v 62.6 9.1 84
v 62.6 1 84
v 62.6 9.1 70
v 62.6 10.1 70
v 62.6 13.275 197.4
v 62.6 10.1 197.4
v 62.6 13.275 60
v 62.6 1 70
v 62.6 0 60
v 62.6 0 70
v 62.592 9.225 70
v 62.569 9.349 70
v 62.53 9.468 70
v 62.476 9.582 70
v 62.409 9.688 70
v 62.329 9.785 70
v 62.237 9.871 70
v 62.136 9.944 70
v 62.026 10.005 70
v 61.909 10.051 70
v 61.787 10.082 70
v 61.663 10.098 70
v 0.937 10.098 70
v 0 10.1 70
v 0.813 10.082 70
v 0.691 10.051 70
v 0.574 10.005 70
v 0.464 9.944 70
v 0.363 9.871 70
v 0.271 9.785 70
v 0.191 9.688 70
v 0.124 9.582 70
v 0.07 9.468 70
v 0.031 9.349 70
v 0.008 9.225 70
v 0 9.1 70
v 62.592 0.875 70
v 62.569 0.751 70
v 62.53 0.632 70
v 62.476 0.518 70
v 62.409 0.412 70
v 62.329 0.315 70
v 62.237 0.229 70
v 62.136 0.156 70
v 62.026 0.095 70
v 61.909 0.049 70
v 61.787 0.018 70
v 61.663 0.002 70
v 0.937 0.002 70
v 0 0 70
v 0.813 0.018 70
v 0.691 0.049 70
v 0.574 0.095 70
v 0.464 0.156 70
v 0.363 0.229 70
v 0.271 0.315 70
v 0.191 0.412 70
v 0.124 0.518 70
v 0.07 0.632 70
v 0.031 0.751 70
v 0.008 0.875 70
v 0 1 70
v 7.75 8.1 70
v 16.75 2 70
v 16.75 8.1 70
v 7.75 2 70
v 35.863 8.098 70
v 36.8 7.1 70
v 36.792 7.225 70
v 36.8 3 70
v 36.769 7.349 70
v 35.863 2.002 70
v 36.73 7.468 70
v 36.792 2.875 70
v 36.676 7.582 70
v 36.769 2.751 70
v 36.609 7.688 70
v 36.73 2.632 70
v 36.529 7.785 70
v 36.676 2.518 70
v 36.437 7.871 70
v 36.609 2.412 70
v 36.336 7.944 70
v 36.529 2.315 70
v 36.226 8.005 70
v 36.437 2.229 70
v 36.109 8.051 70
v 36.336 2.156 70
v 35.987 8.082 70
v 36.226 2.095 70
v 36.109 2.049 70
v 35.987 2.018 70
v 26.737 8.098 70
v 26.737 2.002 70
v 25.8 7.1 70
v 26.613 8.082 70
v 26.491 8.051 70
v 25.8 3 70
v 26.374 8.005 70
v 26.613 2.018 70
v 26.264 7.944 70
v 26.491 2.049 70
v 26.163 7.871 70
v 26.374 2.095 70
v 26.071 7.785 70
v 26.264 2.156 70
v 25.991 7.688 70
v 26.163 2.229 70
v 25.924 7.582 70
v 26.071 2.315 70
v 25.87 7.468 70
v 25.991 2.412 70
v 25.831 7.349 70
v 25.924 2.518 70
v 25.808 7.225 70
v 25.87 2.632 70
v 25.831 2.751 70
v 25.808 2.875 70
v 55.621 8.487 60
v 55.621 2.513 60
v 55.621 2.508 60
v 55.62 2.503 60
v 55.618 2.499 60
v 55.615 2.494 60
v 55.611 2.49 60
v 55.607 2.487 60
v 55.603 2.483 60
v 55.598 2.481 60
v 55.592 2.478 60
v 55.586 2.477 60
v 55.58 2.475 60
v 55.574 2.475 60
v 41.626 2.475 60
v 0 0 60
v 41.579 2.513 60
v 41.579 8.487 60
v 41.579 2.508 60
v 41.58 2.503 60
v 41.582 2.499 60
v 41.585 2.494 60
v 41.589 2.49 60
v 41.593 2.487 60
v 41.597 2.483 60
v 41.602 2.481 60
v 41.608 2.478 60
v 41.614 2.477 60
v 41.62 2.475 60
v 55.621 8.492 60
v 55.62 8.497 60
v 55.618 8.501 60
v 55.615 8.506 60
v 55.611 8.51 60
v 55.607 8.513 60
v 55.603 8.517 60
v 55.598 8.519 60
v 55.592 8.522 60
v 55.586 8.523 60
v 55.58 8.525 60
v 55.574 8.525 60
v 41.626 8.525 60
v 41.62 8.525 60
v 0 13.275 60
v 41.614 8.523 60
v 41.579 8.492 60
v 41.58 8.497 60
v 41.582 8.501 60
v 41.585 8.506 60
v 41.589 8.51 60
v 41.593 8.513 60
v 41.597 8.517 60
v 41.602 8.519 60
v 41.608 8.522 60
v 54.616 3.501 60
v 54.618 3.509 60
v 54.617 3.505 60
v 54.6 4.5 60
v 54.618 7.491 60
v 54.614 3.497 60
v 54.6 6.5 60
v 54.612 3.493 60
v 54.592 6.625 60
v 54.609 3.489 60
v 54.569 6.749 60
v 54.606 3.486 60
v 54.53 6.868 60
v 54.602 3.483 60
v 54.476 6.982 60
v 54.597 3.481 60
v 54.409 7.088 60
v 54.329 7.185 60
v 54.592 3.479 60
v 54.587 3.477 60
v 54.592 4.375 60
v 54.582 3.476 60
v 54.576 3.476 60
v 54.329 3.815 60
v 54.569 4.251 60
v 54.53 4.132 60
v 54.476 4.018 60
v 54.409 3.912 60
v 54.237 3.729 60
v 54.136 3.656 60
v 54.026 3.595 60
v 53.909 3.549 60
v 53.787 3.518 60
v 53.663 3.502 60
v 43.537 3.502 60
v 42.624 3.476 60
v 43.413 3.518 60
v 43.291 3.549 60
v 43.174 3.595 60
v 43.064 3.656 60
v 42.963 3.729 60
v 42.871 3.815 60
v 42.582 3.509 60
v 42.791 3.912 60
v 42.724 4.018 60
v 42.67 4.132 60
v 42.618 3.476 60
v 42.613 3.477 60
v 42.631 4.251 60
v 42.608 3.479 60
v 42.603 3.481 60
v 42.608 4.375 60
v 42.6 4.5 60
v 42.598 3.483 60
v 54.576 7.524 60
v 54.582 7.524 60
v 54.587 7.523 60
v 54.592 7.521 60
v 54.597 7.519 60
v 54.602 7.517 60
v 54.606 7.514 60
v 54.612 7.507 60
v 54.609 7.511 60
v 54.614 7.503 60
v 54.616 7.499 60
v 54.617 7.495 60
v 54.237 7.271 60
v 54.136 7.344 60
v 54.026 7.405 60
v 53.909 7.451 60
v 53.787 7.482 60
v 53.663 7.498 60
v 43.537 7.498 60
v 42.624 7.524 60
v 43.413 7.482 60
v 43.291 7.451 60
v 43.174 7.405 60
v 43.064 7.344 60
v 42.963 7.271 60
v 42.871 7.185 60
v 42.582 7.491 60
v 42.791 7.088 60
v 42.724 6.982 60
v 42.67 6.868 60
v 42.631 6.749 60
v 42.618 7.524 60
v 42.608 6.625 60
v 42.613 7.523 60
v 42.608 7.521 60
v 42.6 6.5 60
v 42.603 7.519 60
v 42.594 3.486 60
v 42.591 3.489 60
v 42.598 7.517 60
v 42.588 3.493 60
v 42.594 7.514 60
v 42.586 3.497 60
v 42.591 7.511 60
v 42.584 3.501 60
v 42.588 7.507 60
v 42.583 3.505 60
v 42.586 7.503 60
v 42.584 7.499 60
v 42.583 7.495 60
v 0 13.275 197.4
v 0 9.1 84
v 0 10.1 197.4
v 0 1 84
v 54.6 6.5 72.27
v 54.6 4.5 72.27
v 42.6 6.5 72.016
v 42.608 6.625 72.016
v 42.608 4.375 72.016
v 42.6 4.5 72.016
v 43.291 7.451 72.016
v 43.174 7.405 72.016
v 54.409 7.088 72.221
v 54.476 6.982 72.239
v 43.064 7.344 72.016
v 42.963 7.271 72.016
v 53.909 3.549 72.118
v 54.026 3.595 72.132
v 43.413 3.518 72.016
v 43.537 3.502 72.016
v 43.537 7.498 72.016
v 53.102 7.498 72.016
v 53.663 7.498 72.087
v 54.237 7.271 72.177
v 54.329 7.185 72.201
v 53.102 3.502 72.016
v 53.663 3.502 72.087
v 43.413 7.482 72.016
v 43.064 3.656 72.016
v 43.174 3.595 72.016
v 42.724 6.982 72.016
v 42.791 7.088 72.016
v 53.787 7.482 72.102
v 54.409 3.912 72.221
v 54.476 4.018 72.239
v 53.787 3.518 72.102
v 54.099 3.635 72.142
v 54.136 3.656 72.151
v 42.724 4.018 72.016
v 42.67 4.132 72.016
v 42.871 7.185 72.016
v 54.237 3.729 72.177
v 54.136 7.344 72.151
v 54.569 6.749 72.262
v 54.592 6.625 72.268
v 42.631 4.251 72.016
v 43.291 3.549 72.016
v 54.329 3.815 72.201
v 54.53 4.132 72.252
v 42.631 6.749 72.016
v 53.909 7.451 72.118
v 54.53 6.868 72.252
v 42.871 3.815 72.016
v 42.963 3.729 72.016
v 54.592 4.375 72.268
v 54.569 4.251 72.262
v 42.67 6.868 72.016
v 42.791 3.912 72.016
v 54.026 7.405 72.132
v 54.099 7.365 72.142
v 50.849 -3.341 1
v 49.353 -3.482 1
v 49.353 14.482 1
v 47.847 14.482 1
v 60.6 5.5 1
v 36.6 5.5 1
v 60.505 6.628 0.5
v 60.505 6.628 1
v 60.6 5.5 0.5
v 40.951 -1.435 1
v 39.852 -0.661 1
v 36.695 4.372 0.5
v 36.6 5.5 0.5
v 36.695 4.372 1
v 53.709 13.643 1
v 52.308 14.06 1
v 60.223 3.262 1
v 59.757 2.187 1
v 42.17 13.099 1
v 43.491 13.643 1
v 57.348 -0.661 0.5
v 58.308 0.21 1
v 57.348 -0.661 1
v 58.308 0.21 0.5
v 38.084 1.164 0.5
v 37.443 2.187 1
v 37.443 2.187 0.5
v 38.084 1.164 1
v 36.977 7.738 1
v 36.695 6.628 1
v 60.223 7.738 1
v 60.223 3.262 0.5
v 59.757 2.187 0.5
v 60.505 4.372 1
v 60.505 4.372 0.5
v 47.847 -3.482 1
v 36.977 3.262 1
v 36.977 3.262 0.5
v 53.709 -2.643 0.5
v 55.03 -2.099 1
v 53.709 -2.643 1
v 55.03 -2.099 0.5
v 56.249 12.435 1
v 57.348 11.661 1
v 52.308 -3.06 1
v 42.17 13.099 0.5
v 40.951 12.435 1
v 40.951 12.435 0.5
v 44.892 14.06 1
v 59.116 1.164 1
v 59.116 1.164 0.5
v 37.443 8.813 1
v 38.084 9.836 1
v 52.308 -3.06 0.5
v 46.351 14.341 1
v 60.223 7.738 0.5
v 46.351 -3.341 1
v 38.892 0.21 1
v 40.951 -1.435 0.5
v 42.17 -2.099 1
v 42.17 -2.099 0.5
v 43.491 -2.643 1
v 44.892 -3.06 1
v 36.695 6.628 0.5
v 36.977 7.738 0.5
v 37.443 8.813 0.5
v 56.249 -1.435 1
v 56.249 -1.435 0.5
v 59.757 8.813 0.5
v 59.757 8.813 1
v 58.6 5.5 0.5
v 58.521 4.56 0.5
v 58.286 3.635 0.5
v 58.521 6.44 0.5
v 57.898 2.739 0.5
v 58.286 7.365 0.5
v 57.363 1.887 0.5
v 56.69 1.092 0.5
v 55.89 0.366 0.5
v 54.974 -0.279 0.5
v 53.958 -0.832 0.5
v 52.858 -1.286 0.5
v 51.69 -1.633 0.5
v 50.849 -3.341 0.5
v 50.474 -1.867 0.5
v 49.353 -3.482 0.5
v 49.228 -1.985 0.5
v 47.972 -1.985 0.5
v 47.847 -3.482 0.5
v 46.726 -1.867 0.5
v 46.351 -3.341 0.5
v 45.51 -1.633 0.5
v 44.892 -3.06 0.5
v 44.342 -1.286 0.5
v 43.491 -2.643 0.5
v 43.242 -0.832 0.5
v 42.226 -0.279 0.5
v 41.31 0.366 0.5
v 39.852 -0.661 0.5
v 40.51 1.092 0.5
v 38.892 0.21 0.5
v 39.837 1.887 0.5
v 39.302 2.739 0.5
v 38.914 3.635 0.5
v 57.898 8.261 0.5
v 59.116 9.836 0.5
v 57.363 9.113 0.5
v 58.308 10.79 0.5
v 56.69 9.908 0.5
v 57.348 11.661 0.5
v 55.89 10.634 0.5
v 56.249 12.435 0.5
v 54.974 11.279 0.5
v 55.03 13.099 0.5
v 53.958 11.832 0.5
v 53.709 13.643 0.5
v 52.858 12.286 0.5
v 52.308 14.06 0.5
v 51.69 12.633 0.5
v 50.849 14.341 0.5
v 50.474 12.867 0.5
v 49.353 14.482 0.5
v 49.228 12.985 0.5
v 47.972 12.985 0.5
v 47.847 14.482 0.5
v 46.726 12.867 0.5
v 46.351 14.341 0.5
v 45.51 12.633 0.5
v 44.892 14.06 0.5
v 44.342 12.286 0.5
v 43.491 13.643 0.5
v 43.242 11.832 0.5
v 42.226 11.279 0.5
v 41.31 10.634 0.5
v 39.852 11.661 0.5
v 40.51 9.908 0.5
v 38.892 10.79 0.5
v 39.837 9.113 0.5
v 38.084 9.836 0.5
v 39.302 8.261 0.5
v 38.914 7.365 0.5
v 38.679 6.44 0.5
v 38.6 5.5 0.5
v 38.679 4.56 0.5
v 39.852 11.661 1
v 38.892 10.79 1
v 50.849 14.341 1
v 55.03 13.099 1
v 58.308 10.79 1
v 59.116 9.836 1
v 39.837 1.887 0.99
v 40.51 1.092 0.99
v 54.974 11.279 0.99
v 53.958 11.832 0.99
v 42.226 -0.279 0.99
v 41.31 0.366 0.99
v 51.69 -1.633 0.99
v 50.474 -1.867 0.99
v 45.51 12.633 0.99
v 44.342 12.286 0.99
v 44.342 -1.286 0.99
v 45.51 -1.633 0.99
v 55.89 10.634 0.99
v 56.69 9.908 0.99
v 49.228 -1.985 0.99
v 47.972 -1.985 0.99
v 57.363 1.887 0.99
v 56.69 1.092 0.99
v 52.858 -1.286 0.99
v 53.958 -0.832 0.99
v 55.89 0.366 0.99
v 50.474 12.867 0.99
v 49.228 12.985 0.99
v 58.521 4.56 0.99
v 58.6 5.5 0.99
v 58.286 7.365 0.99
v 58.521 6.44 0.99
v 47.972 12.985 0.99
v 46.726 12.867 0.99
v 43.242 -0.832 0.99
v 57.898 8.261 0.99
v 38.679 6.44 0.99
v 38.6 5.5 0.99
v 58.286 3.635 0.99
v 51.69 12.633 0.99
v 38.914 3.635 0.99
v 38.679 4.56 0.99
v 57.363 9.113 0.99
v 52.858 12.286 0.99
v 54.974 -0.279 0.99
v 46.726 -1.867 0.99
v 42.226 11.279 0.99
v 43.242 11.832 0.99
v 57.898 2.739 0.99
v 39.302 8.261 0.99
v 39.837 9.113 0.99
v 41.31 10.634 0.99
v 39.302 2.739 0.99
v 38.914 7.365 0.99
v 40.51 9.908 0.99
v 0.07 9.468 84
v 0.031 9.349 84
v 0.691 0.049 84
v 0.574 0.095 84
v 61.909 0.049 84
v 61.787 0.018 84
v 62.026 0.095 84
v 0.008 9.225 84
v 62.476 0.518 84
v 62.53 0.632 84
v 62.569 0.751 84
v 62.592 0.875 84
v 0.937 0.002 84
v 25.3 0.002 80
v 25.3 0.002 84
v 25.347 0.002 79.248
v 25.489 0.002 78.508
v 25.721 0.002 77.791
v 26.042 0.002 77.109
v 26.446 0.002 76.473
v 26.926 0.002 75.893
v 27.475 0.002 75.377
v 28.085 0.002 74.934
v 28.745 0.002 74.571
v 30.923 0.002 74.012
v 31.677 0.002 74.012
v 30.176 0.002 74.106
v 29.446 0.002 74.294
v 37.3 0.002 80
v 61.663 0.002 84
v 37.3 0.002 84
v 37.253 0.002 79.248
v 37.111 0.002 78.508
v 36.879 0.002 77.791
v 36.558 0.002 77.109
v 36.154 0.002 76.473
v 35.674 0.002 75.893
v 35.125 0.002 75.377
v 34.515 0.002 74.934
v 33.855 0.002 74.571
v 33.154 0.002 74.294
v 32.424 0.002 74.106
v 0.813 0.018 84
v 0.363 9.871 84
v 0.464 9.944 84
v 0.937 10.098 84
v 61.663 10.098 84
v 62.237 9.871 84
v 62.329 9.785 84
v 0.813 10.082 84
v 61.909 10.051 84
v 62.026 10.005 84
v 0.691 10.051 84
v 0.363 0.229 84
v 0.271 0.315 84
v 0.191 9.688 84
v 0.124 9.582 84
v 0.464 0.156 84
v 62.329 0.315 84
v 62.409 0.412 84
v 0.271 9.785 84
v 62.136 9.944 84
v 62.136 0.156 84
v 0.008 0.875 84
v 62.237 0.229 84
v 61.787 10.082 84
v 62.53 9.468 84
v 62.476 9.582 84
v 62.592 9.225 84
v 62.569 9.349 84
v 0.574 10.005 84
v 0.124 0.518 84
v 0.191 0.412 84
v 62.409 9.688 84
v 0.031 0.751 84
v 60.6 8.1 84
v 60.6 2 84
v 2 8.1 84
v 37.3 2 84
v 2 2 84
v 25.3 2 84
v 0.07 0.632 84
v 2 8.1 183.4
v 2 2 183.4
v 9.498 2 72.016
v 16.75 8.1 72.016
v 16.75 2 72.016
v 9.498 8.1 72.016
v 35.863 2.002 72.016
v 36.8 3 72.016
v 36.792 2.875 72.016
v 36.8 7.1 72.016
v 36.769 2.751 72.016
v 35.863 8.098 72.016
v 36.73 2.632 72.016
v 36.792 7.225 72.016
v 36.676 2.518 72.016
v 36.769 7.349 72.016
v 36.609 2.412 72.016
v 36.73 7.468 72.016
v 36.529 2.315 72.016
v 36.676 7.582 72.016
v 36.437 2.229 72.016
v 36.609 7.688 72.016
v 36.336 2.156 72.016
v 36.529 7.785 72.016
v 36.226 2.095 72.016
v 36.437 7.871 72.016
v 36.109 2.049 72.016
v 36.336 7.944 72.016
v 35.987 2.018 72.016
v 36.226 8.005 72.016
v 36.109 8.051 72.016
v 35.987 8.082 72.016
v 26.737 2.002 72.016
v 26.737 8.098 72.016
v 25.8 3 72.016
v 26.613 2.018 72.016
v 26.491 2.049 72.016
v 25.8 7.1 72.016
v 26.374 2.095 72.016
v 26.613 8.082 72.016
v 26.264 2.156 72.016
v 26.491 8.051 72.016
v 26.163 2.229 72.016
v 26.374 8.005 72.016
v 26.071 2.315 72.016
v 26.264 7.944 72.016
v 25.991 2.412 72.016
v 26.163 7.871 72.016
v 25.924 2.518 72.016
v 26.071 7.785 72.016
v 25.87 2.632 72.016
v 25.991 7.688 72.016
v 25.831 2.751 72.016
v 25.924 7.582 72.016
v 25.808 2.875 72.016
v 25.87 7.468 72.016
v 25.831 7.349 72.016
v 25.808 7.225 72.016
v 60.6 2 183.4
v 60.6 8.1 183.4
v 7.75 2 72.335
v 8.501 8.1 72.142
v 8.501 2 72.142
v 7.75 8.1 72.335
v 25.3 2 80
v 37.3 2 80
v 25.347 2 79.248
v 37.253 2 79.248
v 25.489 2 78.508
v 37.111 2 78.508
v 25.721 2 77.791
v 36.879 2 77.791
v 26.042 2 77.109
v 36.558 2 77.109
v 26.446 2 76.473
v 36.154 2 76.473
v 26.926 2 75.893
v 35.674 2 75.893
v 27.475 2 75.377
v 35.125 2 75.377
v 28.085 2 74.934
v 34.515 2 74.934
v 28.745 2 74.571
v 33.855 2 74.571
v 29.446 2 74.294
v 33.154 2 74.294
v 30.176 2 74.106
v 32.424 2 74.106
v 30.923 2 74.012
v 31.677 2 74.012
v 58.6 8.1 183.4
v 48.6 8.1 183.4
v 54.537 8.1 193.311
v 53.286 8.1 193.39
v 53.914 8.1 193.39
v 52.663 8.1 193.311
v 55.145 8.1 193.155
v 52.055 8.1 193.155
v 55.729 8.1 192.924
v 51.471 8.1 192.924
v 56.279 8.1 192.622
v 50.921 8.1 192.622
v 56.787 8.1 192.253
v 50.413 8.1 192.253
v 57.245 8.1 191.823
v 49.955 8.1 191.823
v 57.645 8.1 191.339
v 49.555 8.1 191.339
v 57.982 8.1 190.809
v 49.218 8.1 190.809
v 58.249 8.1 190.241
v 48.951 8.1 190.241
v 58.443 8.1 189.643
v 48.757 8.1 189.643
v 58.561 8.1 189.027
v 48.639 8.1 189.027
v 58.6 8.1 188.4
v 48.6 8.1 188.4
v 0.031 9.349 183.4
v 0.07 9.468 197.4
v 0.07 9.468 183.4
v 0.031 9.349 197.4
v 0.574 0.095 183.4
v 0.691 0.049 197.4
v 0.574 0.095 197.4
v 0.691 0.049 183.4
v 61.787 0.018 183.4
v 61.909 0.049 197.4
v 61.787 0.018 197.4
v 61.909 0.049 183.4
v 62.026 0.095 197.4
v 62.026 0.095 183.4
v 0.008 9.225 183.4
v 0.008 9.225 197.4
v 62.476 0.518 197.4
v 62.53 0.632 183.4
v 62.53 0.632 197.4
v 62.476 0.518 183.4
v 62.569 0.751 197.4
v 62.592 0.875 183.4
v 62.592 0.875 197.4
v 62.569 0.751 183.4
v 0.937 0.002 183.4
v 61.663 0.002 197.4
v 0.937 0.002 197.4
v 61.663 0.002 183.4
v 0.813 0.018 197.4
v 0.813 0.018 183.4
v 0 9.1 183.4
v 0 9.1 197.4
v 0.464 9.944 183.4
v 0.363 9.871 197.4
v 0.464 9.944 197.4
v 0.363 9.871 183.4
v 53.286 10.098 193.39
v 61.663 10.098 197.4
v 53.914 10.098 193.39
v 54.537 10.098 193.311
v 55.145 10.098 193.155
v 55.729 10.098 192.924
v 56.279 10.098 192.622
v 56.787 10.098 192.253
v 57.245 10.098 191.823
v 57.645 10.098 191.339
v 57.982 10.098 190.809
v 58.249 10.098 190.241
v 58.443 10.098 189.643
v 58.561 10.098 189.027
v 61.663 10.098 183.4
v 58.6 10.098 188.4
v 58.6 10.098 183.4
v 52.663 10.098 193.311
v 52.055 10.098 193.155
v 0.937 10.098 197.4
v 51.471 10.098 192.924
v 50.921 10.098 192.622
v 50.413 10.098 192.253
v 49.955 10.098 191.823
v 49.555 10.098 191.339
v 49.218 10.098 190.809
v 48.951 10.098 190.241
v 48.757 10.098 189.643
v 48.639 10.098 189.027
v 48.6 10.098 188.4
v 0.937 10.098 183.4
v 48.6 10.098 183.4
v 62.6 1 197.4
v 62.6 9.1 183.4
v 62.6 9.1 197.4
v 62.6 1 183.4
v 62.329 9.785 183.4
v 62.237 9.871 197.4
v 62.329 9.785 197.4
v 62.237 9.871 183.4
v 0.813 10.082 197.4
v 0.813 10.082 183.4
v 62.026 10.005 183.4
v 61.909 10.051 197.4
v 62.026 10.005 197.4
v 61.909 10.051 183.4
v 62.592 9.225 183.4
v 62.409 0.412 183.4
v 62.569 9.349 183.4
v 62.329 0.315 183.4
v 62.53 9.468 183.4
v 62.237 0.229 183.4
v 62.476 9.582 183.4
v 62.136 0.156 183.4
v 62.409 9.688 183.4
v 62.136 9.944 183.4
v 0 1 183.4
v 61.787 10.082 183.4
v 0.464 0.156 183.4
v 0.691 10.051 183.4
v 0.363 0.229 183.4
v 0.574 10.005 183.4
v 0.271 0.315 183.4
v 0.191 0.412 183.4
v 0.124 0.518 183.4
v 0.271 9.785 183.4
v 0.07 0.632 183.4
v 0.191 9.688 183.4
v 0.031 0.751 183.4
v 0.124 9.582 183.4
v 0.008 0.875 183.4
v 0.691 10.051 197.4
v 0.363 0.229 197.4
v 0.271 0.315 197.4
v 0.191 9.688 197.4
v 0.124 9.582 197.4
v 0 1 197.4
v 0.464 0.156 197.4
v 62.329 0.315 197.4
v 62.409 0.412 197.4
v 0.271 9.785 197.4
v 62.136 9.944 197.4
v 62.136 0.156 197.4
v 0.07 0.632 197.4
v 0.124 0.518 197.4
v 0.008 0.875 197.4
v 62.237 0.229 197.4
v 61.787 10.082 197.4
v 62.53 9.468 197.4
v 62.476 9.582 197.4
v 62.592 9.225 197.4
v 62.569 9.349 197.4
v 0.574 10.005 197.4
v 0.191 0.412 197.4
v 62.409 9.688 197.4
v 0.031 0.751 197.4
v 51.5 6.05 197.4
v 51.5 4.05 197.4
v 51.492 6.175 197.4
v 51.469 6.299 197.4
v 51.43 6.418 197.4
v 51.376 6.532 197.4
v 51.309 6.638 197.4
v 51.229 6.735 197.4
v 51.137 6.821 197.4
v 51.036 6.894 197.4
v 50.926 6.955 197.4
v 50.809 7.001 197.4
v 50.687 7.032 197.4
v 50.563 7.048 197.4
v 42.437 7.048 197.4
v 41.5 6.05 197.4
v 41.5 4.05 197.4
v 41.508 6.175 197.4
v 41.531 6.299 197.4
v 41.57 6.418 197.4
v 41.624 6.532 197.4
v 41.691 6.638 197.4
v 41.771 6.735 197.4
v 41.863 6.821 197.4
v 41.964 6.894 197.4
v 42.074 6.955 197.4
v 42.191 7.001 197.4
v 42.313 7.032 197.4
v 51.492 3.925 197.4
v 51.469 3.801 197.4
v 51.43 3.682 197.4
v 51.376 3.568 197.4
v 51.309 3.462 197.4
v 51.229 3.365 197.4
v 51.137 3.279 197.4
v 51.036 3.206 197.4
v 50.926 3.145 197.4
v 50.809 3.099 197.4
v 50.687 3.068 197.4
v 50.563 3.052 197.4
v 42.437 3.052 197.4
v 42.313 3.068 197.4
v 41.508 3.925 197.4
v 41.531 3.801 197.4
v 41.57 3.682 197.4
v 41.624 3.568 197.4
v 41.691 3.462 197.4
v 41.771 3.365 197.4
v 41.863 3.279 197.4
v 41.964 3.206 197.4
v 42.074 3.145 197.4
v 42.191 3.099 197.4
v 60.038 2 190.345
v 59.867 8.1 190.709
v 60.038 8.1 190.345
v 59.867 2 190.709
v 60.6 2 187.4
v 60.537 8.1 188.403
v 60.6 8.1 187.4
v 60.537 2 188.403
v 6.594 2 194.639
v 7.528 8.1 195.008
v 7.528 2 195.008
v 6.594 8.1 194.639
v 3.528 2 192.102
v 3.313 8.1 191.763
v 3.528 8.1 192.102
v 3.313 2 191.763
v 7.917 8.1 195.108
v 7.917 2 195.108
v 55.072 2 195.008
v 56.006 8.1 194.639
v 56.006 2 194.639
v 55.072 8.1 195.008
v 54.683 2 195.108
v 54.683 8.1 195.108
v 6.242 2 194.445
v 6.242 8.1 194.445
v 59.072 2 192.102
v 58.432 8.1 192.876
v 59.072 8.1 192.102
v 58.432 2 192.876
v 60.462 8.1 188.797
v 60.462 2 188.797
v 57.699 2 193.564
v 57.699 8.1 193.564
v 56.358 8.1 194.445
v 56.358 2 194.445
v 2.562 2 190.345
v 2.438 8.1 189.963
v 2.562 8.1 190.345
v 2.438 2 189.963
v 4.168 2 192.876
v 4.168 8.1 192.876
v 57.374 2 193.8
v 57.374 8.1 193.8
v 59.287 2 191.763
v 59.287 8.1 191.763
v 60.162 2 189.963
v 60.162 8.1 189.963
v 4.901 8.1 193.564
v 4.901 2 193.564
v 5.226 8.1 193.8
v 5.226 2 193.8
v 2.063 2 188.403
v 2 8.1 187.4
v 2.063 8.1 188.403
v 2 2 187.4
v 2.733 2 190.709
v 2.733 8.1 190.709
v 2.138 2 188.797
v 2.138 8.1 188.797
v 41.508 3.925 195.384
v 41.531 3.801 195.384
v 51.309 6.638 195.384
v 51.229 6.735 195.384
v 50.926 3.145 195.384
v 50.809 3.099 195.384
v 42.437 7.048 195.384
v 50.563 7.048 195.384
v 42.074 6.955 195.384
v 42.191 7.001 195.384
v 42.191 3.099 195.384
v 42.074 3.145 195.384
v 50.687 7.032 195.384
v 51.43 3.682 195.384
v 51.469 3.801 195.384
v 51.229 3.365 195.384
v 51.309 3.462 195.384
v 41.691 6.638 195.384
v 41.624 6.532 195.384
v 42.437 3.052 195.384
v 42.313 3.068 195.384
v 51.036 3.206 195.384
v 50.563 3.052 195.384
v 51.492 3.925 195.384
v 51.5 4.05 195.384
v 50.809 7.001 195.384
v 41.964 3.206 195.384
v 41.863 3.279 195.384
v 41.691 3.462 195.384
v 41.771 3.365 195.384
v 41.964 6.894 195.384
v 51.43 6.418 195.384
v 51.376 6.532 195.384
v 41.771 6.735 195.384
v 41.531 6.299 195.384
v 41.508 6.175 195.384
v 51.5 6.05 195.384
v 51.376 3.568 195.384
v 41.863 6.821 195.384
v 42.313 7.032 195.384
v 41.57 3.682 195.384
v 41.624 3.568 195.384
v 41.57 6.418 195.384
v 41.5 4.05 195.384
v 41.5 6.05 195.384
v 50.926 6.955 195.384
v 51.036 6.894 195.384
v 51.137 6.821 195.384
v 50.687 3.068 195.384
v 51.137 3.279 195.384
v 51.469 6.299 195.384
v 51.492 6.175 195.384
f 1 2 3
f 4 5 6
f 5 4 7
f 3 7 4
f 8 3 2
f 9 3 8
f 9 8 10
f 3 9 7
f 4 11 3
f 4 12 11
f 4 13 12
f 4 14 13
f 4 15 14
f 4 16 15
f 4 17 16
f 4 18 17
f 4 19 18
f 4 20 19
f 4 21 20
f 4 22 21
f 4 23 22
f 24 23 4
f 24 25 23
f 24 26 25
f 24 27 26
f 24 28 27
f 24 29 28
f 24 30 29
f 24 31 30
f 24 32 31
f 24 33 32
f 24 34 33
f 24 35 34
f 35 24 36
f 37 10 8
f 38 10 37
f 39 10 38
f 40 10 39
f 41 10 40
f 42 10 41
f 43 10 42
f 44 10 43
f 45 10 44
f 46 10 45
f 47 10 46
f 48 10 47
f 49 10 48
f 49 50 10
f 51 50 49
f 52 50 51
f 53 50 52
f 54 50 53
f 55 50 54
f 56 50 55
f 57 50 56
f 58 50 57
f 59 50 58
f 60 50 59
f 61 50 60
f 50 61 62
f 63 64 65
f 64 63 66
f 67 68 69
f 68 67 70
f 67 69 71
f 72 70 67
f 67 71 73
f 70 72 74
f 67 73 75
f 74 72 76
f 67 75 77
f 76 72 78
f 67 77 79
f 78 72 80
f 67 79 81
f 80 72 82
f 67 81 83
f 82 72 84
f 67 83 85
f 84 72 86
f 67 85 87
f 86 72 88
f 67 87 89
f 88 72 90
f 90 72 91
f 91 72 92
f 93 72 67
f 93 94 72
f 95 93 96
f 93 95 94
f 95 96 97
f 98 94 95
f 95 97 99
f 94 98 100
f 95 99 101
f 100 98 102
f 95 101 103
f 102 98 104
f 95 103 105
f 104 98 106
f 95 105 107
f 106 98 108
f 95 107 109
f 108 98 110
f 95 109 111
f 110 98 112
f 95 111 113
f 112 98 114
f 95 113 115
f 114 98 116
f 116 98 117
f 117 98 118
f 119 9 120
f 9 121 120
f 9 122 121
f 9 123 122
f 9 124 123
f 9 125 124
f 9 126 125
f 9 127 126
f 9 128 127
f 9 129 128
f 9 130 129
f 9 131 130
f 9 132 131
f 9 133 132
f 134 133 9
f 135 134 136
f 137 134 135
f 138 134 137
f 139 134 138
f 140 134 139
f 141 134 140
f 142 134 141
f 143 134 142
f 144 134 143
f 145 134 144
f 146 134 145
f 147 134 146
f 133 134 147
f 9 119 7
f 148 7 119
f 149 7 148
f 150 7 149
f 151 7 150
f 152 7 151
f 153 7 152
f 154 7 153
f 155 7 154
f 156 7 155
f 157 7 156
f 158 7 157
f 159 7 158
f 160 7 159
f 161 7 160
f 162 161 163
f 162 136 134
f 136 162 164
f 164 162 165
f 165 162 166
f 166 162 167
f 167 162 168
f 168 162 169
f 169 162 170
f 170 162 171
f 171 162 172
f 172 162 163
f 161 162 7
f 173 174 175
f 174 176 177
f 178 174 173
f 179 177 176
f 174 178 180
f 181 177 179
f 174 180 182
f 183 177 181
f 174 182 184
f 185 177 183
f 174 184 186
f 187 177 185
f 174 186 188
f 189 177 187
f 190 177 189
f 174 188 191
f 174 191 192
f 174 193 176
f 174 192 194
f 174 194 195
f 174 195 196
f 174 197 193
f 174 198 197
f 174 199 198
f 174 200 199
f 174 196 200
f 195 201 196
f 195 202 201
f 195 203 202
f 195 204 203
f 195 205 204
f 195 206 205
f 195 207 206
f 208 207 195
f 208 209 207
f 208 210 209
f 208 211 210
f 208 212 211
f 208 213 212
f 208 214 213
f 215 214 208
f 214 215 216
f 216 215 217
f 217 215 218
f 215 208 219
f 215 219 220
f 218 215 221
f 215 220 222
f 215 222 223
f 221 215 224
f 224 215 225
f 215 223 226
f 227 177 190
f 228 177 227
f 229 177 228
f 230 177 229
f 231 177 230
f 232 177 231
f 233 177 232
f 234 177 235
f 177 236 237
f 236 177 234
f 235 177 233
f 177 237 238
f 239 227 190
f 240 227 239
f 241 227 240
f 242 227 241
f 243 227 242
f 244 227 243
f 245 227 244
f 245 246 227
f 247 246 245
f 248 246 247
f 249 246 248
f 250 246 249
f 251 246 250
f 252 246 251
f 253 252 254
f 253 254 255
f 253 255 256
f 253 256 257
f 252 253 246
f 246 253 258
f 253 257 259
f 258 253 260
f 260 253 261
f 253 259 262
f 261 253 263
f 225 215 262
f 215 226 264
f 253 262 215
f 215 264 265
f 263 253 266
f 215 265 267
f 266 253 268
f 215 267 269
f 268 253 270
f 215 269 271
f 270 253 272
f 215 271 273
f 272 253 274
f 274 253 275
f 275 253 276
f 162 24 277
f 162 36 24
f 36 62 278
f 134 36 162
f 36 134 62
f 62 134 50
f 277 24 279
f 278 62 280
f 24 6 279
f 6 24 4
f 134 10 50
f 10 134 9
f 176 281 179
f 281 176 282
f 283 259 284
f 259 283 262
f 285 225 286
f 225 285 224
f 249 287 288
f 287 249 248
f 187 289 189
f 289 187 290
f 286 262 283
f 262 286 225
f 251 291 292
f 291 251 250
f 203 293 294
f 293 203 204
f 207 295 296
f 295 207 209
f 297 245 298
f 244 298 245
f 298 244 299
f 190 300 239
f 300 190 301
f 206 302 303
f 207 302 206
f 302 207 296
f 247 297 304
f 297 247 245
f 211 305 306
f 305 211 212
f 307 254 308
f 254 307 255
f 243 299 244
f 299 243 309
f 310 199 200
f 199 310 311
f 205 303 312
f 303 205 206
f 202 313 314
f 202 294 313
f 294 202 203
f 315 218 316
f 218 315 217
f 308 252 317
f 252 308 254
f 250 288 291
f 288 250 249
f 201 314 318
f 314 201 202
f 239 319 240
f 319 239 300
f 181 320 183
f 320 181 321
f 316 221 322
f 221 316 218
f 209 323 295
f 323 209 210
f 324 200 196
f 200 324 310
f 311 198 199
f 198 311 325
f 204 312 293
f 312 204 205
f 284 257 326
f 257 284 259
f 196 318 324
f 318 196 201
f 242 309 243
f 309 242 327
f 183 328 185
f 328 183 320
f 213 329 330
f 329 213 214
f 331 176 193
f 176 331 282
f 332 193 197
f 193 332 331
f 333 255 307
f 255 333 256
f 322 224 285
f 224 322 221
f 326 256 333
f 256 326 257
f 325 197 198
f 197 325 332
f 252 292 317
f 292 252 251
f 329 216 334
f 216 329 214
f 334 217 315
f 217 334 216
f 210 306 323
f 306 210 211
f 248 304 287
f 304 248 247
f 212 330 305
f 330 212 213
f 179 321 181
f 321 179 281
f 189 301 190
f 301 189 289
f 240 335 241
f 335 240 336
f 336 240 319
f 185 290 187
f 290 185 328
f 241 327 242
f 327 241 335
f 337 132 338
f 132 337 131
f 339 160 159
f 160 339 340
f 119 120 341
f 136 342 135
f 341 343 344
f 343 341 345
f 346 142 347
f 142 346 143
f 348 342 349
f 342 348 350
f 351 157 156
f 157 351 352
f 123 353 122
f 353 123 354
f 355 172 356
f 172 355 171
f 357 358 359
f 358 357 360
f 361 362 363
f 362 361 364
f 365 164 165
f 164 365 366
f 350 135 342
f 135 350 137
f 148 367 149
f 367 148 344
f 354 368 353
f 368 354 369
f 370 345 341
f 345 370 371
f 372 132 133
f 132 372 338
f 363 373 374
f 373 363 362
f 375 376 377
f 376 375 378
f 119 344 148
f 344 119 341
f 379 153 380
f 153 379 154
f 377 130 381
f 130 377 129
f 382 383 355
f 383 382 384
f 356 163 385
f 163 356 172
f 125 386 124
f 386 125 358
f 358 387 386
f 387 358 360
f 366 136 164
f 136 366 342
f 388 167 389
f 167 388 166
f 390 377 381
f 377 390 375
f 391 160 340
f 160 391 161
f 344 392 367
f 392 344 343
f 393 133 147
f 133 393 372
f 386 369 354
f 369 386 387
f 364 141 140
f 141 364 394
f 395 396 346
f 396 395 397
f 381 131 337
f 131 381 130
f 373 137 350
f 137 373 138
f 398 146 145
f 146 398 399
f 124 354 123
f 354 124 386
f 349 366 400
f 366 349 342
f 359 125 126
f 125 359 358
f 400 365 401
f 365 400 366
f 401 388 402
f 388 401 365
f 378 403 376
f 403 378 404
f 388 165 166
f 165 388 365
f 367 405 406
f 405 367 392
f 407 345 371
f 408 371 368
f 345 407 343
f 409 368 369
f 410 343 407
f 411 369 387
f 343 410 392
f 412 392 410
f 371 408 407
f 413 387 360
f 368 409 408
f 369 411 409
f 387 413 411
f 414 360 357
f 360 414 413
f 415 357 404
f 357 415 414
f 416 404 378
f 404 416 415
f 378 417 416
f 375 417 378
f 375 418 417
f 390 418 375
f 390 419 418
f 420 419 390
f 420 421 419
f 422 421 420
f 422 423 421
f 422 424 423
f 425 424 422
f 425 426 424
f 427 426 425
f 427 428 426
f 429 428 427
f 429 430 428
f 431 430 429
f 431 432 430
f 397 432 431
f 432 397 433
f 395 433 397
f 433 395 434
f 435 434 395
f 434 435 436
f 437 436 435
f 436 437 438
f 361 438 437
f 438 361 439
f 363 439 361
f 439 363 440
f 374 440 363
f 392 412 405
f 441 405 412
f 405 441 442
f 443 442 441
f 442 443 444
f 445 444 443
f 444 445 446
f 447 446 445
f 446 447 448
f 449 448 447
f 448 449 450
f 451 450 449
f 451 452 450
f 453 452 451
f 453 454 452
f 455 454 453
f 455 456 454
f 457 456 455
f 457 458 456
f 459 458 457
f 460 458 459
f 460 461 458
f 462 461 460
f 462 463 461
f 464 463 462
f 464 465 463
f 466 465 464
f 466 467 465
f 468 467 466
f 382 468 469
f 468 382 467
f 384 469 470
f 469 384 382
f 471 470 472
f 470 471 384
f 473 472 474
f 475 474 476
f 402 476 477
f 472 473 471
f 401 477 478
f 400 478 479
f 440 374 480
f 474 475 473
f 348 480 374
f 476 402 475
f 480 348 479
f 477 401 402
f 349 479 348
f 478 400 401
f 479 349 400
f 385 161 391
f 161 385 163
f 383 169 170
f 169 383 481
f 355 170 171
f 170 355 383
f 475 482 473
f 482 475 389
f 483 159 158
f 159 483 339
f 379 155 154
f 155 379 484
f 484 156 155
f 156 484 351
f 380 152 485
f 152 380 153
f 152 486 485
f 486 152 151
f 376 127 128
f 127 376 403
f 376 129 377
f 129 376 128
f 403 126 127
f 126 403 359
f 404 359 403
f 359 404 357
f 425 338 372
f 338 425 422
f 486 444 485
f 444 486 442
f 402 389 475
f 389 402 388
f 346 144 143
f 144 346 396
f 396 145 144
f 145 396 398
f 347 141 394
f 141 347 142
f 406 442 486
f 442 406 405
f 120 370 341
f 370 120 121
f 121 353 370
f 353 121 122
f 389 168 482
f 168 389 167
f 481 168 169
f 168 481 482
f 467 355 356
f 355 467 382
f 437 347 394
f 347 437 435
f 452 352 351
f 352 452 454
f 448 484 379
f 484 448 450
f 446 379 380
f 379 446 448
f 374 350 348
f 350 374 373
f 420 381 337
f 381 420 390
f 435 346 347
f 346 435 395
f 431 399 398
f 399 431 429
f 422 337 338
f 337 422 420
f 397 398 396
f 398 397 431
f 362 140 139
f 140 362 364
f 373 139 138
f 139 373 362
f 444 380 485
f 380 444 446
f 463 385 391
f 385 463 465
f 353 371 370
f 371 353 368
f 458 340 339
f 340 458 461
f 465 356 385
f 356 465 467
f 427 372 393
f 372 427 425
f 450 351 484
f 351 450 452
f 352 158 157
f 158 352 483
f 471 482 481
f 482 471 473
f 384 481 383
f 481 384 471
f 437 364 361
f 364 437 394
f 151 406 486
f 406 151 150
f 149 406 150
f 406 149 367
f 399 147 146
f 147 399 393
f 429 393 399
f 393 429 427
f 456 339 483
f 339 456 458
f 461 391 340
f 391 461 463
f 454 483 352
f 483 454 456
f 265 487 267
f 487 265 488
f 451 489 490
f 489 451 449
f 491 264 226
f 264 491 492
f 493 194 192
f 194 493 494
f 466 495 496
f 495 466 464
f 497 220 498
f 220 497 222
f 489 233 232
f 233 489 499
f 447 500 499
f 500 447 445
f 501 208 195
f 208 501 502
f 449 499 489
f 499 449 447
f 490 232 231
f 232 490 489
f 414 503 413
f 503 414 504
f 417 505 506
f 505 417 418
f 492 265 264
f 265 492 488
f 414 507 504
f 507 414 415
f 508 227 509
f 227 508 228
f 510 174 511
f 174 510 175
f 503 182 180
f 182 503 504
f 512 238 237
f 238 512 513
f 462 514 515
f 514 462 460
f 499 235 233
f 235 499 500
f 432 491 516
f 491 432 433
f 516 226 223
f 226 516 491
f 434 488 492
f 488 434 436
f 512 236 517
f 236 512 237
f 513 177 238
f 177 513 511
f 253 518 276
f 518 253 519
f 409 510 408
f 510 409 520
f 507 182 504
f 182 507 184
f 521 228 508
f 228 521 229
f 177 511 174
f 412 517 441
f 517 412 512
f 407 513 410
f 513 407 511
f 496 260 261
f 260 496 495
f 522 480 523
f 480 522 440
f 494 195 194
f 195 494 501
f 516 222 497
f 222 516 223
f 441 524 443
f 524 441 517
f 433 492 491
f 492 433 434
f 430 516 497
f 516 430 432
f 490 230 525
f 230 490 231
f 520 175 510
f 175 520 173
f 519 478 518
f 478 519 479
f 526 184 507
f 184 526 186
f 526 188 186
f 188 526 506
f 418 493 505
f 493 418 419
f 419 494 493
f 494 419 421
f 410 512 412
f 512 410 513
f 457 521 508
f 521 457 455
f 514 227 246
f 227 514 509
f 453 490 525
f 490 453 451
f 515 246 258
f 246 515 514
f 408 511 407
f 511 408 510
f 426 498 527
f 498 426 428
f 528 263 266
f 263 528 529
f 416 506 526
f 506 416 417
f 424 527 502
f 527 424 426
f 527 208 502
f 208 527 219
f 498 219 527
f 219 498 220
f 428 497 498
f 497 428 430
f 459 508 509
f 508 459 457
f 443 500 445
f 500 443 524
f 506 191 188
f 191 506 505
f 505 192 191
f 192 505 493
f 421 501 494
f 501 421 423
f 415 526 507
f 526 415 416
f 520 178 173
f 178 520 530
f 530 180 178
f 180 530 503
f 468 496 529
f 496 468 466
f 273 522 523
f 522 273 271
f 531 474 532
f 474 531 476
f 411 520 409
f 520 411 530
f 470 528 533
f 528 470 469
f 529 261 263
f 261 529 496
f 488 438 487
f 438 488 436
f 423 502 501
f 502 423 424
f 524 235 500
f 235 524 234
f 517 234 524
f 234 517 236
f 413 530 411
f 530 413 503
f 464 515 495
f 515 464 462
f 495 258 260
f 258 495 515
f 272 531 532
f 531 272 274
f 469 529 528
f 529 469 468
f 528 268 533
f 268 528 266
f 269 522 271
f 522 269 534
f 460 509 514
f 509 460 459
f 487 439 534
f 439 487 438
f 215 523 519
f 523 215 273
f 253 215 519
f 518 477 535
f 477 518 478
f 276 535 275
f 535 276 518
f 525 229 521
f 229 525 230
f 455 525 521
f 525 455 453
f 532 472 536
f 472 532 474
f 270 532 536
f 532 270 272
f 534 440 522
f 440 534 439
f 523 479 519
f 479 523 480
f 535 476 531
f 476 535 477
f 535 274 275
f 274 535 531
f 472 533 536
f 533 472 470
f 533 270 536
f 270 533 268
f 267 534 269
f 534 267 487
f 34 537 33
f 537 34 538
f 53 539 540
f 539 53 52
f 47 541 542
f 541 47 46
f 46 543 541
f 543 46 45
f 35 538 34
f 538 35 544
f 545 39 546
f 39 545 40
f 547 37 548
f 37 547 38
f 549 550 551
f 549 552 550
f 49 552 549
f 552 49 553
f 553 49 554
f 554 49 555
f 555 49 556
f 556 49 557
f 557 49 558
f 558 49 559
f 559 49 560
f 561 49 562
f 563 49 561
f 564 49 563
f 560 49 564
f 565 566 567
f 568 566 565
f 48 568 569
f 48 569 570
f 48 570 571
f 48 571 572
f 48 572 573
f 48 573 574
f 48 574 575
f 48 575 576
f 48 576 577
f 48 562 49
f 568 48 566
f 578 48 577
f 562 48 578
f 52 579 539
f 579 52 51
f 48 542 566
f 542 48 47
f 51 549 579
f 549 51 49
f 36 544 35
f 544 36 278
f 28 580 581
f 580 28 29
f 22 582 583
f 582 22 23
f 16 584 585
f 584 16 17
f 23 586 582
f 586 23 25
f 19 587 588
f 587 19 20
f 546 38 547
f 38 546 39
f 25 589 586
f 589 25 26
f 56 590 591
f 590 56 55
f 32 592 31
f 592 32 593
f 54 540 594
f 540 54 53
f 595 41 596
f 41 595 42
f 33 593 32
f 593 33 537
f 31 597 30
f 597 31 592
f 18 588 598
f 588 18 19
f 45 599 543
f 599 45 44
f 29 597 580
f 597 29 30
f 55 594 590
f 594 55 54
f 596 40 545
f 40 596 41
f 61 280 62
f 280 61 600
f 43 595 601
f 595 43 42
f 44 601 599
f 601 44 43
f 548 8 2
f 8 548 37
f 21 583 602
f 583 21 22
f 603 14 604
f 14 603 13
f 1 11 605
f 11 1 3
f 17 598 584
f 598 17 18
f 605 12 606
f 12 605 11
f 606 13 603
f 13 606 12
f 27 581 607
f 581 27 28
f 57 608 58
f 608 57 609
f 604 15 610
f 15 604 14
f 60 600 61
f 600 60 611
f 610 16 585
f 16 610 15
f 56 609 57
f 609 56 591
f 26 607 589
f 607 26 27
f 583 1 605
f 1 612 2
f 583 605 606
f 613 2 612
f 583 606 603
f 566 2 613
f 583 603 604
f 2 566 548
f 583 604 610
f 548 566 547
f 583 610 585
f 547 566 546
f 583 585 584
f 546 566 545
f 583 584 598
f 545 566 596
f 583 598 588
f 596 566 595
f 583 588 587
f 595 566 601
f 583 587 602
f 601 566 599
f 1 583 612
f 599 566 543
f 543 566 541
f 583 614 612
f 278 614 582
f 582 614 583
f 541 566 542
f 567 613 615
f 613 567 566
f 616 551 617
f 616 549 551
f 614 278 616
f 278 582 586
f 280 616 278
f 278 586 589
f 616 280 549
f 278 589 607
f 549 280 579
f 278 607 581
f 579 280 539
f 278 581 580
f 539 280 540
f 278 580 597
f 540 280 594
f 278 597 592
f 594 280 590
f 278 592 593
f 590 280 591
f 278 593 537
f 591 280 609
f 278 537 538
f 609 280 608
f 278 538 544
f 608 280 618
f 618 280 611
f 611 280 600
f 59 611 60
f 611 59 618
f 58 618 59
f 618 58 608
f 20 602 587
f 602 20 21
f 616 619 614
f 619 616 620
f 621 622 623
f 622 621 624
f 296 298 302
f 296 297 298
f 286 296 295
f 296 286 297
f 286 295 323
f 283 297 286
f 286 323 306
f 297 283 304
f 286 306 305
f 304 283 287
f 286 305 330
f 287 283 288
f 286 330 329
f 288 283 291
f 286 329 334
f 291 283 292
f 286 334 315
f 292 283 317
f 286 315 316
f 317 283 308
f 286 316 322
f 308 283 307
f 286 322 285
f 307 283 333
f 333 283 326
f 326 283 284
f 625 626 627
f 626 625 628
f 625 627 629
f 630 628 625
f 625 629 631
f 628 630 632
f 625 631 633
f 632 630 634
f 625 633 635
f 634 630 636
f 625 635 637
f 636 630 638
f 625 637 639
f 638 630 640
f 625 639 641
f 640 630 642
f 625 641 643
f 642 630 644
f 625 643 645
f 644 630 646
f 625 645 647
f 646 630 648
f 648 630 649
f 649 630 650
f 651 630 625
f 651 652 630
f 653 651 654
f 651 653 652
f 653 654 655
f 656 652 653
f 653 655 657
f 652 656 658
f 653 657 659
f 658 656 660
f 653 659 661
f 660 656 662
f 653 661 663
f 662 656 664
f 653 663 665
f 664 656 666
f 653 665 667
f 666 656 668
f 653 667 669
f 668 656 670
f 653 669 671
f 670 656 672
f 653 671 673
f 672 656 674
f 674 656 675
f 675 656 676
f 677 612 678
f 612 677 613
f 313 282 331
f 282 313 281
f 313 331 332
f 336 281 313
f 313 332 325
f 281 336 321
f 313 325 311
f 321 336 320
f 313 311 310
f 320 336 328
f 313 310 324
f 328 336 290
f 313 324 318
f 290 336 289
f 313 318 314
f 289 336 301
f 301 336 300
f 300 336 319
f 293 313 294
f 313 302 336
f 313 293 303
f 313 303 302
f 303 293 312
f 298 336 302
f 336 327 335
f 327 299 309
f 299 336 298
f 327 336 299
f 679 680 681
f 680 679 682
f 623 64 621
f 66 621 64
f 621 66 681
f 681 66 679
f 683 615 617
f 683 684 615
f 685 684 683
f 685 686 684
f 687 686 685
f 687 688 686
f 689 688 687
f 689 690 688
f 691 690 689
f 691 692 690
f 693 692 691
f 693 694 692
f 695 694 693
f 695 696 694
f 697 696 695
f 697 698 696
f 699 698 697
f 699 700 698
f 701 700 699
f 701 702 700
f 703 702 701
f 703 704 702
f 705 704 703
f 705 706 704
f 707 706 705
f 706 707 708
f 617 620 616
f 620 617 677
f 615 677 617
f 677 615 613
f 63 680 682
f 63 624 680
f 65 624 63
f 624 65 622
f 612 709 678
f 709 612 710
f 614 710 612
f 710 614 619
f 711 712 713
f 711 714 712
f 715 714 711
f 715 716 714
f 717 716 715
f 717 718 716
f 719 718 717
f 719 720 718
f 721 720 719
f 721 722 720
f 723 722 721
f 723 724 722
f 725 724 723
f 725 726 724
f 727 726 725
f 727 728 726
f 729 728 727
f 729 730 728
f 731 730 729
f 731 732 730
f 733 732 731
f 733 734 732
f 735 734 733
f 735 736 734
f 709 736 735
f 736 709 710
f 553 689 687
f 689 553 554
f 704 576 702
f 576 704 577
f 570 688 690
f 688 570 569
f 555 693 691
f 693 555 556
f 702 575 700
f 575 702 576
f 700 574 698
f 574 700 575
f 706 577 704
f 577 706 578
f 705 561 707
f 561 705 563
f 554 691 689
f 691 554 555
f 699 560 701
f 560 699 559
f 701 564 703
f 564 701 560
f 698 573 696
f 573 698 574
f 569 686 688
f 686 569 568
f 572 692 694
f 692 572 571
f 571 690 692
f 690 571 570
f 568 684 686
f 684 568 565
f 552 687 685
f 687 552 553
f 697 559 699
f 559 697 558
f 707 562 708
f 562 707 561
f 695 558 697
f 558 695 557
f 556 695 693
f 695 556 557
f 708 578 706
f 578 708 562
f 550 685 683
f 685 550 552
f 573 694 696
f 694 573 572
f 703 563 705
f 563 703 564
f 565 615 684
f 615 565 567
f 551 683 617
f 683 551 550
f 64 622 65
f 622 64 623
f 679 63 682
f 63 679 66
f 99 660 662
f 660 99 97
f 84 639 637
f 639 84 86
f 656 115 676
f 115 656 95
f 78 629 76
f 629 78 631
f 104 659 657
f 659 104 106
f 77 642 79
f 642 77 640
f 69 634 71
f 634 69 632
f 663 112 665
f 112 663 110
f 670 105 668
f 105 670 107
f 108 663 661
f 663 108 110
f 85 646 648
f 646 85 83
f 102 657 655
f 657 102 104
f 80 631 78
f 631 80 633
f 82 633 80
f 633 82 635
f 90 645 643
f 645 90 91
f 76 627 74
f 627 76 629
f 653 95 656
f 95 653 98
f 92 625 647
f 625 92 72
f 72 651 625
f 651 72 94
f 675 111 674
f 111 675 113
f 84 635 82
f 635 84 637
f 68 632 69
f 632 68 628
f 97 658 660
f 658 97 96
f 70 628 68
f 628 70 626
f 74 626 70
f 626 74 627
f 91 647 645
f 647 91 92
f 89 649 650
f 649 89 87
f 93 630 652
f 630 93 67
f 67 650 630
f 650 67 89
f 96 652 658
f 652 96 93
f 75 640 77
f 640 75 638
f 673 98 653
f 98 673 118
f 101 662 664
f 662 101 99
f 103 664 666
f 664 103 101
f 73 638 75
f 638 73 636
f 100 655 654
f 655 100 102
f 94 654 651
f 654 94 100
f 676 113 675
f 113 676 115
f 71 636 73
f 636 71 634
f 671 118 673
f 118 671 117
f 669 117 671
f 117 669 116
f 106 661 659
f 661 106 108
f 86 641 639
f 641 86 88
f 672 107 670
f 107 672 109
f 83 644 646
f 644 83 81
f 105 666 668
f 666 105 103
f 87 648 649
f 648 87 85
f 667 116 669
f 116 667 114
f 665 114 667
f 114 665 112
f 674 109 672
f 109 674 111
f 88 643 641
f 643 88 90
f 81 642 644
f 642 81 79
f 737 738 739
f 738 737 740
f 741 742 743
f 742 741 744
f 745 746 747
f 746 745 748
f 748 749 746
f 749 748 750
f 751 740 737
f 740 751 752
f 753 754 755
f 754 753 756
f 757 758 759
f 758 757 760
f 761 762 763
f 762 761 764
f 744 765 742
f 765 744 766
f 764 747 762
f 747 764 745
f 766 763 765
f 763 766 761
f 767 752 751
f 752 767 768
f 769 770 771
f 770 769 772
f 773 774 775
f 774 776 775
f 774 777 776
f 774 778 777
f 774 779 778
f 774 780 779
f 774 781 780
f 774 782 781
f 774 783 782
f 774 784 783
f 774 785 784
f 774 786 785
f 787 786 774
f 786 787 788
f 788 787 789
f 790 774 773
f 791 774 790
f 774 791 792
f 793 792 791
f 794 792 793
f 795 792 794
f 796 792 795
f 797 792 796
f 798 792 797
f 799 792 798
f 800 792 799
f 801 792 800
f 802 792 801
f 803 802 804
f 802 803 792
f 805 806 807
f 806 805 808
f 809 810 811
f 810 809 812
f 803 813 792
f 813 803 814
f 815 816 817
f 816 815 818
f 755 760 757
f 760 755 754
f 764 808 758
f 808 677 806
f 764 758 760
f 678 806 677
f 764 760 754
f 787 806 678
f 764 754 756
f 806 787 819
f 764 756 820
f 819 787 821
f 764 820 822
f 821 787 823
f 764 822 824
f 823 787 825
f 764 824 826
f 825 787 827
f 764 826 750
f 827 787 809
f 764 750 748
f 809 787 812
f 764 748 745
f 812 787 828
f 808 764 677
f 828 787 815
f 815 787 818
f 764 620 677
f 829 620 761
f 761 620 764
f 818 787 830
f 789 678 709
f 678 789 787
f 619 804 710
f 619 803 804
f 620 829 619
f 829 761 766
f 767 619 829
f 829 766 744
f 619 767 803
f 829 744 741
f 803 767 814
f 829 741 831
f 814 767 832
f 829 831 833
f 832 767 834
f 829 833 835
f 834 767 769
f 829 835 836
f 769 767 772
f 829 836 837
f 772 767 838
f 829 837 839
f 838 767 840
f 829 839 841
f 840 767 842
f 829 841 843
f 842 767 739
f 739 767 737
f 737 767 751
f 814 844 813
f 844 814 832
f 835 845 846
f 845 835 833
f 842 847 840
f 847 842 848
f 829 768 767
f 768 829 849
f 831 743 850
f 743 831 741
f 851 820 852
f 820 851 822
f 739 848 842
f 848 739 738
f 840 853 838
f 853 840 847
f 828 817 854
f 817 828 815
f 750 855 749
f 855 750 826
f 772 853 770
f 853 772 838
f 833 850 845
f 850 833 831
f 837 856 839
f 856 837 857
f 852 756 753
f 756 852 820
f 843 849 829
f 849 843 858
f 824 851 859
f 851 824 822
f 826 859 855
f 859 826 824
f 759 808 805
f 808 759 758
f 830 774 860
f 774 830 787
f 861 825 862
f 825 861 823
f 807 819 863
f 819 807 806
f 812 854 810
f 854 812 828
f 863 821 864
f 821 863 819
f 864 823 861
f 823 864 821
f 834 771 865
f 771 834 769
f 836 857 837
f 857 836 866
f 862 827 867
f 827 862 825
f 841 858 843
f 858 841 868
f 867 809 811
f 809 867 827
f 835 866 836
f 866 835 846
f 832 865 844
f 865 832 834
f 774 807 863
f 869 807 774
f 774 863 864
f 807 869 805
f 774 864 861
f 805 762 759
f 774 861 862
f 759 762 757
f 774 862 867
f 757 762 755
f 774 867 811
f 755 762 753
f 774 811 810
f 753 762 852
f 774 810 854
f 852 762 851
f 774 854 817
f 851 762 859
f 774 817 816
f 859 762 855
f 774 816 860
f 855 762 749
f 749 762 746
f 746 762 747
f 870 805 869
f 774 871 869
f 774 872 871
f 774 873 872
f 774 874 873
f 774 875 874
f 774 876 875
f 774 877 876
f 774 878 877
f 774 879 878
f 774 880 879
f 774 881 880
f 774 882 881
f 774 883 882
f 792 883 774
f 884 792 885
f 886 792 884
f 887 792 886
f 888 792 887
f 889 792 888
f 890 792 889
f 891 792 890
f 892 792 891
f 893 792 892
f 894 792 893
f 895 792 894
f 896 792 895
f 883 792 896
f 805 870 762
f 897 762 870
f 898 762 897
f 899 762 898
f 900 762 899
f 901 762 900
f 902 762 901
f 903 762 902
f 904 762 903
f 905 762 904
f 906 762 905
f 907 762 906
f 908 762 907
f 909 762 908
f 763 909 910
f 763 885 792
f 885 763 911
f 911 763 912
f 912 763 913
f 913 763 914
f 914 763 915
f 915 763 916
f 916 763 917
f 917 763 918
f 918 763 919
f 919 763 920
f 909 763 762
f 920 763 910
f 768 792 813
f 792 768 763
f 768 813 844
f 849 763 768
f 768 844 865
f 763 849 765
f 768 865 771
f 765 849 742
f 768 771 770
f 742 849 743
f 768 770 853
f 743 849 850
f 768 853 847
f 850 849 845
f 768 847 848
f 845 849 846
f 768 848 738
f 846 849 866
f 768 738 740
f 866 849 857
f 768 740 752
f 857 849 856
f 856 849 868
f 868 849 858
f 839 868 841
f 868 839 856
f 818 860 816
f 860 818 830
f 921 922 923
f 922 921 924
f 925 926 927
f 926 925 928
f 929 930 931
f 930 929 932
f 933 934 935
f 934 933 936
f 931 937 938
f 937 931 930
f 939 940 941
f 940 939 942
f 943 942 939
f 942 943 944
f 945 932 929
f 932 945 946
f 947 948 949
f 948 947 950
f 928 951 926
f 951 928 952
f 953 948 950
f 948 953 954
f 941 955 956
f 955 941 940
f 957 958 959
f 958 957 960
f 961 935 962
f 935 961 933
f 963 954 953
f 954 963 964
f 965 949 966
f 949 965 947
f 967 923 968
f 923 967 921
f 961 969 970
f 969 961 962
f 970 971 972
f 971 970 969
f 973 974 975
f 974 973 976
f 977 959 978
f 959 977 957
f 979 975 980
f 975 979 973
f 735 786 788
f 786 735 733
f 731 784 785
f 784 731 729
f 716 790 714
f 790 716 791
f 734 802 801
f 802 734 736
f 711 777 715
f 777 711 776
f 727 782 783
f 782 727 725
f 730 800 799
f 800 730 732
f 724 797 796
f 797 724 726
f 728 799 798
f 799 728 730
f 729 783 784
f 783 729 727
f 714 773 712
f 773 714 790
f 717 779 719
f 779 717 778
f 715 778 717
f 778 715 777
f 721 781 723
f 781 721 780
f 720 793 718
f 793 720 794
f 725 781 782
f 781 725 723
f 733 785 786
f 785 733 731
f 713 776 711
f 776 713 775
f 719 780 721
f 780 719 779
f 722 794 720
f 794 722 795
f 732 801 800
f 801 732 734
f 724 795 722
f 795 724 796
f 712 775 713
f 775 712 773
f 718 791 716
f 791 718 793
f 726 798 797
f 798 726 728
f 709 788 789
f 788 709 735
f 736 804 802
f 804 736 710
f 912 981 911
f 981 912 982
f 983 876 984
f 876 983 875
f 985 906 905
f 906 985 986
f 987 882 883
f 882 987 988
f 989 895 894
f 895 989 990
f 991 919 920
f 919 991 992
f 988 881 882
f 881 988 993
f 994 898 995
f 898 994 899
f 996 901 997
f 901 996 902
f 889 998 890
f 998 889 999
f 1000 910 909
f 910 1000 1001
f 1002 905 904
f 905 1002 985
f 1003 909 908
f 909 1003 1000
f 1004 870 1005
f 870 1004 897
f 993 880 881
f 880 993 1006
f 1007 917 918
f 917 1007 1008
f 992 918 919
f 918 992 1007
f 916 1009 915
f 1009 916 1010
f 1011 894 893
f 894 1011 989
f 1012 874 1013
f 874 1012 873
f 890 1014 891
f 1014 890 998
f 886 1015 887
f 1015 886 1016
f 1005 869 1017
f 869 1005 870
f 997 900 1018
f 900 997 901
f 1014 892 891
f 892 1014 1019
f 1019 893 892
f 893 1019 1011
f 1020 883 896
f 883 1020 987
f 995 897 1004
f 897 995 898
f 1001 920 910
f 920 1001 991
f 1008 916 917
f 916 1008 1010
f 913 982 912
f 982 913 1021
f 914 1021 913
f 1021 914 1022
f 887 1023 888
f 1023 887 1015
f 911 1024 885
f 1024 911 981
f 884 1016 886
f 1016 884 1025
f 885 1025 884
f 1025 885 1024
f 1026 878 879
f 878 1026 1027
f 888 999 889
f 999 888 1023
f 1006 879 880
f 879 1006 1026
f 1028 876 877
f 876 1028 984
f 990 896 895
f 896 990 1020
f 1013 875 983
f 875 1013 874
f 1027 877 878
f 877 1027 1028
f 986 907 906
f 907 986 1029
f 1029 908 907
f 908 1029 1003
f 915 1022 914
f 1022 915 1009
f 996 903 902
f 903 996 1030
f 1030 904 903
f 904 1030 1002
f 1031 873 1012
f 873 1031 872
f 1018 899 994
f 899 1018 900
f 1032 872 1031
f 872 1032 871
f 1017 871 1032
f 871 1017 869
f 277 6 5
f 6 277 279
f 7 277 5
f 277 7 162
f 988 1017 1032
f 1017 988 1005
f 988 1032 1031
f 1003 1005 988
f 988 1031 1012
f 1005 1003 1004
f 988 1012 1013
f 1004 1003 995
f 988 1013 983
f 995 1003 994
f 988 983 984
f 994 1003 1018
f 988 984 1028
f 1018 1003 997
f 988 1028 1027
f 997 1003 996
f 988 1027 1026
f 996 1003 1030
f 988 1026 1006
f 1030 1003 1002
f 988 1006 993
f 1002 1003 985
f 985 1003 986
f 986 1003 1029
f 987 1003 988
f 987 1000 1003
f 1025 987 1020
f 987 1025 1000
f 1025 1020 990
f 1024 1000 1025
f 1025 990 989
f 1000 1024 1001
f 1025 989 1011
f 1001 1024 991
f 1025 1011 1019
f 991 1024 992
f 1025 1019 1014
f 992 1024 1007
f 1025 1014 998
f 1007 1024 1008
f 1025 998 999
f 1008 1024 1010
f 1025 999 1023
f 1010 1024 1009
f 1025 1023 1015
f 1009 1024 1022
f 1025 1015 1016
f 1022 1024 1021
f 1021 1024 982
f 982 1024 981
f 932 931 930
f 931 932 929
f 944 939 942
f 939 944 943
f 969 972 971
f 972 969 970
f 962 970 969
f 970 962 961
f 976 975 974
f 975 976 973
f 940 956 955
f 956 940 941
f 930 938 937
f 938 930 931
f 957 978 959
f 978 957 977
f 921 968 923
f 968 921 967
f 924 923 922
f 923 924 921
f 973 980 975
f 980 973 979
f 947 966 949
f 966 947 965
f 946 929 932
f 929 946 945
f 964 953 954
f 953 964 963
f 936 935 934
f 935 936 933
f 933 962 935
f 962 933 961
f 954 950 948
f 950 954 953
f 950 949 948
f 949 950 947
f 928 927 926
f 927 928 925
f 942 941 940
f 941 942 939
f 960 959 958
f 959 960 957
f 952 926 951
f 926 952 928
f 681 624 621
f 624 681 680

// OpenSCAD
// file: ../lib/basics.scad
// ## `basics.scad`
// This library contains basic elements to construct mobile device augmentations.

// ### `roundedCube(dimension,edgeRadius)`
// A cube with rounded edges on the depth axis. This function is helpful for creating simple phone shapes.
// #### Where
// * `dimension=[width,depth,height]`: the size of the cube
// * `edgeRadius`: the radius of the rounded edges 
module roundedCube(dimension=[10,10,10],edgeRadius=1){
    translate([0,dimension[1],0])
		rotate([90,0,0])
			hull(){
        		translate([edgeRadius,edgeRadius,0])
					cylinder(r=edgeRadius,h=dimension[1]);
        		translate([dimension[0]-edgeRadius,edgeRadius,0])
					cylinder(r=edgeRadius,h=dimension[1]);
        		translate([edgeRadius,dimension[2]-edgeRadius,0])
					cylinder(r=edgeRadius,h=dimension[1]);
        		translate([dimension[0]-edgeRadius,dimension[2]-edgeRadius,0])
					cylinder(r=edgeRadius,h=dimension[1]);
    		}
}

// ### `bottomHolder(deviceWidth,deviceDepth,deviceEdgeRadius,deviceHeightInHolder,wallThickness,holderEdgeRadius)`
// A basic generic element to hold the bottom part of a device
// #### Where
// * `deviceWidth`: the width of the device to be held
// * `deviceDepth`: the depth of the device to be held
// * `deviceEdgeRadius`: the edge radius of the device to be held
// * `deviceHeightInHolder`: the height of the part of the holder covering the device
// * `wallThickness`: the holder's wall thickness
// * `holderEdgeRadius`: the holder's edge radius
module bottomHolder(deviceWidth=10,deviceDepth=10,deviceEdgeRadius=1,
deviceHeightInHolder=10,wallThickness=1,holderEdgeRadius=1){
	difference(){
		translate([0,deviceDepth+wallThickness*2,0])
			rotate([90,0,0])
				roundedCube([deviceWidth+wallThickness*2,deviceHeightInHolder+wallThickness,
				deviceDepth+wallThickness*2],holderEdgeRadius);
		translate([wallThickness,wallThickness,wallThickness])
			roundedCube([deviceWidth,deviceDepth,
			deviceHeightInHolder+deviceEdgeRadius],deviceEdgeRadius);
	}
}

// ### `topHolder(deviceWidth,deviceDepth,deviceEdgeRadius,deviceHeightInHolder,wallThickness,lipsWidth,holderEdgeRadius)`
// A basic generic element to hold the top part of a device
// #### Where
// * `deviceWidth`: the width of the device to be held
// * `deviceDepth`: the depth of the device to be held
// * `deviceEdgeRadius`: the edge radius of the device to be held
// * `deviceHeightInHolder`: the height of the part of the holder covering the device
// * `wallThickness`: the holder's wall thickness
// * `lipsWidth`: size of the lips holding the device
// * `holderEdgeRadius`: the holder's edge radius
module topHolder(deviceWidth=10,deviceDepth=10,deviceEdgeRadius=1,deviceHeightInHolder=10,
wallThickness=1,lipsWidth=2,holderEdgeRadius=1){
	difference(){
		translate([0,deviceDepth+wallThickness*2,0])rotate([90,0,0])
			roundedCube([deviceWidth+wallThickness*2,deviceHeightInHolder+wallThickness,
			deviceDepth+wallThickness*2],holderEdgeRadius);
		translate([wallThickness,wallThickness,-wallThickness*2])
			roundedCube([deviceWidth,deviceDepth,deviceHeightInHolder],deviceEdgeRadius);
		//translate([wallThickness+lipsWidth,-0.01,-wallThickness-lipsWidth-0.85]) // TODO: 0.85 wrong here: needs to be fixed
		//	roundedCube([deviceWidth-lipsWidth*2,wallThickness+0.02,deviceHeightInHolder],
	//		deviceEdgeRadius*((deviceWidth-lipsWidth*2)/deviceWidth));
	}
}

// ### `rectangleCircularHorn(rectangleWidth,rectangleHeight,circleRadius,hornLength,wallThickness,hornDeformationFactor,hornDerivation,endsHeight)`
// A horn with a square termination on one side and a circle termination on the other.
// #### Where
// * `rectangleWidth`: the width of the rectangular termination
// * `rectangleHeight`: the height of the rectangular termination
// * `circleRadius`: the radius of the circular termination
// * `hornLength`: the length of the horn
// * `wallThickness`: the thickness of the walls
// * `hornDeformationFactor`: controls the vertical flatness of the horn with (1=perfect circle, >1=flatened circle) 
// * `hornDerivation`: displace the position of the circular end relatively to the rectangular end on the horizontal axis
// * `endsHeight`: the height of the two ends
module rectangleCircularHorn(rectangleWidth=10,rectangleHeight=10,circleRadius=10,hornLength=10,wallThickness=1,
hornDeformationFactor=1,hornDerivation=0,endsHeight=0.5){
	difference(){
		hull(){
			cube([rectangleWidth+wallThickness,rectangleHeight+wallThickness,endsHeight],center=true);
			translate([hornDerivation,0,hornLength-endsHeight*2])
				scale([1,hornDeformationFactor,1])
					cylinder(r=circleRadius+wallThickness,h=endsHeight);
		}
		hull(){
			translate([0,0,-0.01])
				cube([rectangleWidth,rectangleHeight,endsHeight],center=true);
			translate([hornDerivation,0,hornLength-endsHeight*2+0.01])
				scale([1,hornDeformationFactor,1])
					cylinder(r=circleRadius,h=endsHeight);
		}
	}
}

// ### `halfSphere(radius)`
// A half sphere useful to create tops.
// #### Where
// * `radius`: the radius of the half sphere
module halfSphere(radius=10){
	difference(){
		translate([radius,radius,0])sphere(radius);
		translate([0,0,-radius*2])cube([radius*2,radius*2,radius*2]);
	}
}

// ### `halfCylinder(dimension=[10,10,10])`
// A half cylinder with controllable height.
// #### Where
// * `dimension=[width,depth,height]`: the size of the half cylinder
module halfCylinder(dimension=[10,10,10]){
	rotate([-90,0,0])scale([1,dimension[2]/dimension[0],1])difference(){
		translate([dimension[0]/2,0,0.01])cylinder(r=dimension[0]/2,h=dimension[1]);
		cube([dimension[0],dimension[0],dimension[1]+0.02]);
	}
}
// main file
include <../lib/iPodTouch6.scad>

$fn=50;

iPodTouch6_CaseWithSpeakerMouthPipe();
translate([iPodTouch6_Module_WallThickness,iPodTouch6_Module_WallThickness,iPodTouch6_Module_WallThickness+iPodTouch6_SpeakerMouthPipe_HornLength+iPodTouch6_SpeakerMouthPipe_BaseThickness])iPodTouch6();
